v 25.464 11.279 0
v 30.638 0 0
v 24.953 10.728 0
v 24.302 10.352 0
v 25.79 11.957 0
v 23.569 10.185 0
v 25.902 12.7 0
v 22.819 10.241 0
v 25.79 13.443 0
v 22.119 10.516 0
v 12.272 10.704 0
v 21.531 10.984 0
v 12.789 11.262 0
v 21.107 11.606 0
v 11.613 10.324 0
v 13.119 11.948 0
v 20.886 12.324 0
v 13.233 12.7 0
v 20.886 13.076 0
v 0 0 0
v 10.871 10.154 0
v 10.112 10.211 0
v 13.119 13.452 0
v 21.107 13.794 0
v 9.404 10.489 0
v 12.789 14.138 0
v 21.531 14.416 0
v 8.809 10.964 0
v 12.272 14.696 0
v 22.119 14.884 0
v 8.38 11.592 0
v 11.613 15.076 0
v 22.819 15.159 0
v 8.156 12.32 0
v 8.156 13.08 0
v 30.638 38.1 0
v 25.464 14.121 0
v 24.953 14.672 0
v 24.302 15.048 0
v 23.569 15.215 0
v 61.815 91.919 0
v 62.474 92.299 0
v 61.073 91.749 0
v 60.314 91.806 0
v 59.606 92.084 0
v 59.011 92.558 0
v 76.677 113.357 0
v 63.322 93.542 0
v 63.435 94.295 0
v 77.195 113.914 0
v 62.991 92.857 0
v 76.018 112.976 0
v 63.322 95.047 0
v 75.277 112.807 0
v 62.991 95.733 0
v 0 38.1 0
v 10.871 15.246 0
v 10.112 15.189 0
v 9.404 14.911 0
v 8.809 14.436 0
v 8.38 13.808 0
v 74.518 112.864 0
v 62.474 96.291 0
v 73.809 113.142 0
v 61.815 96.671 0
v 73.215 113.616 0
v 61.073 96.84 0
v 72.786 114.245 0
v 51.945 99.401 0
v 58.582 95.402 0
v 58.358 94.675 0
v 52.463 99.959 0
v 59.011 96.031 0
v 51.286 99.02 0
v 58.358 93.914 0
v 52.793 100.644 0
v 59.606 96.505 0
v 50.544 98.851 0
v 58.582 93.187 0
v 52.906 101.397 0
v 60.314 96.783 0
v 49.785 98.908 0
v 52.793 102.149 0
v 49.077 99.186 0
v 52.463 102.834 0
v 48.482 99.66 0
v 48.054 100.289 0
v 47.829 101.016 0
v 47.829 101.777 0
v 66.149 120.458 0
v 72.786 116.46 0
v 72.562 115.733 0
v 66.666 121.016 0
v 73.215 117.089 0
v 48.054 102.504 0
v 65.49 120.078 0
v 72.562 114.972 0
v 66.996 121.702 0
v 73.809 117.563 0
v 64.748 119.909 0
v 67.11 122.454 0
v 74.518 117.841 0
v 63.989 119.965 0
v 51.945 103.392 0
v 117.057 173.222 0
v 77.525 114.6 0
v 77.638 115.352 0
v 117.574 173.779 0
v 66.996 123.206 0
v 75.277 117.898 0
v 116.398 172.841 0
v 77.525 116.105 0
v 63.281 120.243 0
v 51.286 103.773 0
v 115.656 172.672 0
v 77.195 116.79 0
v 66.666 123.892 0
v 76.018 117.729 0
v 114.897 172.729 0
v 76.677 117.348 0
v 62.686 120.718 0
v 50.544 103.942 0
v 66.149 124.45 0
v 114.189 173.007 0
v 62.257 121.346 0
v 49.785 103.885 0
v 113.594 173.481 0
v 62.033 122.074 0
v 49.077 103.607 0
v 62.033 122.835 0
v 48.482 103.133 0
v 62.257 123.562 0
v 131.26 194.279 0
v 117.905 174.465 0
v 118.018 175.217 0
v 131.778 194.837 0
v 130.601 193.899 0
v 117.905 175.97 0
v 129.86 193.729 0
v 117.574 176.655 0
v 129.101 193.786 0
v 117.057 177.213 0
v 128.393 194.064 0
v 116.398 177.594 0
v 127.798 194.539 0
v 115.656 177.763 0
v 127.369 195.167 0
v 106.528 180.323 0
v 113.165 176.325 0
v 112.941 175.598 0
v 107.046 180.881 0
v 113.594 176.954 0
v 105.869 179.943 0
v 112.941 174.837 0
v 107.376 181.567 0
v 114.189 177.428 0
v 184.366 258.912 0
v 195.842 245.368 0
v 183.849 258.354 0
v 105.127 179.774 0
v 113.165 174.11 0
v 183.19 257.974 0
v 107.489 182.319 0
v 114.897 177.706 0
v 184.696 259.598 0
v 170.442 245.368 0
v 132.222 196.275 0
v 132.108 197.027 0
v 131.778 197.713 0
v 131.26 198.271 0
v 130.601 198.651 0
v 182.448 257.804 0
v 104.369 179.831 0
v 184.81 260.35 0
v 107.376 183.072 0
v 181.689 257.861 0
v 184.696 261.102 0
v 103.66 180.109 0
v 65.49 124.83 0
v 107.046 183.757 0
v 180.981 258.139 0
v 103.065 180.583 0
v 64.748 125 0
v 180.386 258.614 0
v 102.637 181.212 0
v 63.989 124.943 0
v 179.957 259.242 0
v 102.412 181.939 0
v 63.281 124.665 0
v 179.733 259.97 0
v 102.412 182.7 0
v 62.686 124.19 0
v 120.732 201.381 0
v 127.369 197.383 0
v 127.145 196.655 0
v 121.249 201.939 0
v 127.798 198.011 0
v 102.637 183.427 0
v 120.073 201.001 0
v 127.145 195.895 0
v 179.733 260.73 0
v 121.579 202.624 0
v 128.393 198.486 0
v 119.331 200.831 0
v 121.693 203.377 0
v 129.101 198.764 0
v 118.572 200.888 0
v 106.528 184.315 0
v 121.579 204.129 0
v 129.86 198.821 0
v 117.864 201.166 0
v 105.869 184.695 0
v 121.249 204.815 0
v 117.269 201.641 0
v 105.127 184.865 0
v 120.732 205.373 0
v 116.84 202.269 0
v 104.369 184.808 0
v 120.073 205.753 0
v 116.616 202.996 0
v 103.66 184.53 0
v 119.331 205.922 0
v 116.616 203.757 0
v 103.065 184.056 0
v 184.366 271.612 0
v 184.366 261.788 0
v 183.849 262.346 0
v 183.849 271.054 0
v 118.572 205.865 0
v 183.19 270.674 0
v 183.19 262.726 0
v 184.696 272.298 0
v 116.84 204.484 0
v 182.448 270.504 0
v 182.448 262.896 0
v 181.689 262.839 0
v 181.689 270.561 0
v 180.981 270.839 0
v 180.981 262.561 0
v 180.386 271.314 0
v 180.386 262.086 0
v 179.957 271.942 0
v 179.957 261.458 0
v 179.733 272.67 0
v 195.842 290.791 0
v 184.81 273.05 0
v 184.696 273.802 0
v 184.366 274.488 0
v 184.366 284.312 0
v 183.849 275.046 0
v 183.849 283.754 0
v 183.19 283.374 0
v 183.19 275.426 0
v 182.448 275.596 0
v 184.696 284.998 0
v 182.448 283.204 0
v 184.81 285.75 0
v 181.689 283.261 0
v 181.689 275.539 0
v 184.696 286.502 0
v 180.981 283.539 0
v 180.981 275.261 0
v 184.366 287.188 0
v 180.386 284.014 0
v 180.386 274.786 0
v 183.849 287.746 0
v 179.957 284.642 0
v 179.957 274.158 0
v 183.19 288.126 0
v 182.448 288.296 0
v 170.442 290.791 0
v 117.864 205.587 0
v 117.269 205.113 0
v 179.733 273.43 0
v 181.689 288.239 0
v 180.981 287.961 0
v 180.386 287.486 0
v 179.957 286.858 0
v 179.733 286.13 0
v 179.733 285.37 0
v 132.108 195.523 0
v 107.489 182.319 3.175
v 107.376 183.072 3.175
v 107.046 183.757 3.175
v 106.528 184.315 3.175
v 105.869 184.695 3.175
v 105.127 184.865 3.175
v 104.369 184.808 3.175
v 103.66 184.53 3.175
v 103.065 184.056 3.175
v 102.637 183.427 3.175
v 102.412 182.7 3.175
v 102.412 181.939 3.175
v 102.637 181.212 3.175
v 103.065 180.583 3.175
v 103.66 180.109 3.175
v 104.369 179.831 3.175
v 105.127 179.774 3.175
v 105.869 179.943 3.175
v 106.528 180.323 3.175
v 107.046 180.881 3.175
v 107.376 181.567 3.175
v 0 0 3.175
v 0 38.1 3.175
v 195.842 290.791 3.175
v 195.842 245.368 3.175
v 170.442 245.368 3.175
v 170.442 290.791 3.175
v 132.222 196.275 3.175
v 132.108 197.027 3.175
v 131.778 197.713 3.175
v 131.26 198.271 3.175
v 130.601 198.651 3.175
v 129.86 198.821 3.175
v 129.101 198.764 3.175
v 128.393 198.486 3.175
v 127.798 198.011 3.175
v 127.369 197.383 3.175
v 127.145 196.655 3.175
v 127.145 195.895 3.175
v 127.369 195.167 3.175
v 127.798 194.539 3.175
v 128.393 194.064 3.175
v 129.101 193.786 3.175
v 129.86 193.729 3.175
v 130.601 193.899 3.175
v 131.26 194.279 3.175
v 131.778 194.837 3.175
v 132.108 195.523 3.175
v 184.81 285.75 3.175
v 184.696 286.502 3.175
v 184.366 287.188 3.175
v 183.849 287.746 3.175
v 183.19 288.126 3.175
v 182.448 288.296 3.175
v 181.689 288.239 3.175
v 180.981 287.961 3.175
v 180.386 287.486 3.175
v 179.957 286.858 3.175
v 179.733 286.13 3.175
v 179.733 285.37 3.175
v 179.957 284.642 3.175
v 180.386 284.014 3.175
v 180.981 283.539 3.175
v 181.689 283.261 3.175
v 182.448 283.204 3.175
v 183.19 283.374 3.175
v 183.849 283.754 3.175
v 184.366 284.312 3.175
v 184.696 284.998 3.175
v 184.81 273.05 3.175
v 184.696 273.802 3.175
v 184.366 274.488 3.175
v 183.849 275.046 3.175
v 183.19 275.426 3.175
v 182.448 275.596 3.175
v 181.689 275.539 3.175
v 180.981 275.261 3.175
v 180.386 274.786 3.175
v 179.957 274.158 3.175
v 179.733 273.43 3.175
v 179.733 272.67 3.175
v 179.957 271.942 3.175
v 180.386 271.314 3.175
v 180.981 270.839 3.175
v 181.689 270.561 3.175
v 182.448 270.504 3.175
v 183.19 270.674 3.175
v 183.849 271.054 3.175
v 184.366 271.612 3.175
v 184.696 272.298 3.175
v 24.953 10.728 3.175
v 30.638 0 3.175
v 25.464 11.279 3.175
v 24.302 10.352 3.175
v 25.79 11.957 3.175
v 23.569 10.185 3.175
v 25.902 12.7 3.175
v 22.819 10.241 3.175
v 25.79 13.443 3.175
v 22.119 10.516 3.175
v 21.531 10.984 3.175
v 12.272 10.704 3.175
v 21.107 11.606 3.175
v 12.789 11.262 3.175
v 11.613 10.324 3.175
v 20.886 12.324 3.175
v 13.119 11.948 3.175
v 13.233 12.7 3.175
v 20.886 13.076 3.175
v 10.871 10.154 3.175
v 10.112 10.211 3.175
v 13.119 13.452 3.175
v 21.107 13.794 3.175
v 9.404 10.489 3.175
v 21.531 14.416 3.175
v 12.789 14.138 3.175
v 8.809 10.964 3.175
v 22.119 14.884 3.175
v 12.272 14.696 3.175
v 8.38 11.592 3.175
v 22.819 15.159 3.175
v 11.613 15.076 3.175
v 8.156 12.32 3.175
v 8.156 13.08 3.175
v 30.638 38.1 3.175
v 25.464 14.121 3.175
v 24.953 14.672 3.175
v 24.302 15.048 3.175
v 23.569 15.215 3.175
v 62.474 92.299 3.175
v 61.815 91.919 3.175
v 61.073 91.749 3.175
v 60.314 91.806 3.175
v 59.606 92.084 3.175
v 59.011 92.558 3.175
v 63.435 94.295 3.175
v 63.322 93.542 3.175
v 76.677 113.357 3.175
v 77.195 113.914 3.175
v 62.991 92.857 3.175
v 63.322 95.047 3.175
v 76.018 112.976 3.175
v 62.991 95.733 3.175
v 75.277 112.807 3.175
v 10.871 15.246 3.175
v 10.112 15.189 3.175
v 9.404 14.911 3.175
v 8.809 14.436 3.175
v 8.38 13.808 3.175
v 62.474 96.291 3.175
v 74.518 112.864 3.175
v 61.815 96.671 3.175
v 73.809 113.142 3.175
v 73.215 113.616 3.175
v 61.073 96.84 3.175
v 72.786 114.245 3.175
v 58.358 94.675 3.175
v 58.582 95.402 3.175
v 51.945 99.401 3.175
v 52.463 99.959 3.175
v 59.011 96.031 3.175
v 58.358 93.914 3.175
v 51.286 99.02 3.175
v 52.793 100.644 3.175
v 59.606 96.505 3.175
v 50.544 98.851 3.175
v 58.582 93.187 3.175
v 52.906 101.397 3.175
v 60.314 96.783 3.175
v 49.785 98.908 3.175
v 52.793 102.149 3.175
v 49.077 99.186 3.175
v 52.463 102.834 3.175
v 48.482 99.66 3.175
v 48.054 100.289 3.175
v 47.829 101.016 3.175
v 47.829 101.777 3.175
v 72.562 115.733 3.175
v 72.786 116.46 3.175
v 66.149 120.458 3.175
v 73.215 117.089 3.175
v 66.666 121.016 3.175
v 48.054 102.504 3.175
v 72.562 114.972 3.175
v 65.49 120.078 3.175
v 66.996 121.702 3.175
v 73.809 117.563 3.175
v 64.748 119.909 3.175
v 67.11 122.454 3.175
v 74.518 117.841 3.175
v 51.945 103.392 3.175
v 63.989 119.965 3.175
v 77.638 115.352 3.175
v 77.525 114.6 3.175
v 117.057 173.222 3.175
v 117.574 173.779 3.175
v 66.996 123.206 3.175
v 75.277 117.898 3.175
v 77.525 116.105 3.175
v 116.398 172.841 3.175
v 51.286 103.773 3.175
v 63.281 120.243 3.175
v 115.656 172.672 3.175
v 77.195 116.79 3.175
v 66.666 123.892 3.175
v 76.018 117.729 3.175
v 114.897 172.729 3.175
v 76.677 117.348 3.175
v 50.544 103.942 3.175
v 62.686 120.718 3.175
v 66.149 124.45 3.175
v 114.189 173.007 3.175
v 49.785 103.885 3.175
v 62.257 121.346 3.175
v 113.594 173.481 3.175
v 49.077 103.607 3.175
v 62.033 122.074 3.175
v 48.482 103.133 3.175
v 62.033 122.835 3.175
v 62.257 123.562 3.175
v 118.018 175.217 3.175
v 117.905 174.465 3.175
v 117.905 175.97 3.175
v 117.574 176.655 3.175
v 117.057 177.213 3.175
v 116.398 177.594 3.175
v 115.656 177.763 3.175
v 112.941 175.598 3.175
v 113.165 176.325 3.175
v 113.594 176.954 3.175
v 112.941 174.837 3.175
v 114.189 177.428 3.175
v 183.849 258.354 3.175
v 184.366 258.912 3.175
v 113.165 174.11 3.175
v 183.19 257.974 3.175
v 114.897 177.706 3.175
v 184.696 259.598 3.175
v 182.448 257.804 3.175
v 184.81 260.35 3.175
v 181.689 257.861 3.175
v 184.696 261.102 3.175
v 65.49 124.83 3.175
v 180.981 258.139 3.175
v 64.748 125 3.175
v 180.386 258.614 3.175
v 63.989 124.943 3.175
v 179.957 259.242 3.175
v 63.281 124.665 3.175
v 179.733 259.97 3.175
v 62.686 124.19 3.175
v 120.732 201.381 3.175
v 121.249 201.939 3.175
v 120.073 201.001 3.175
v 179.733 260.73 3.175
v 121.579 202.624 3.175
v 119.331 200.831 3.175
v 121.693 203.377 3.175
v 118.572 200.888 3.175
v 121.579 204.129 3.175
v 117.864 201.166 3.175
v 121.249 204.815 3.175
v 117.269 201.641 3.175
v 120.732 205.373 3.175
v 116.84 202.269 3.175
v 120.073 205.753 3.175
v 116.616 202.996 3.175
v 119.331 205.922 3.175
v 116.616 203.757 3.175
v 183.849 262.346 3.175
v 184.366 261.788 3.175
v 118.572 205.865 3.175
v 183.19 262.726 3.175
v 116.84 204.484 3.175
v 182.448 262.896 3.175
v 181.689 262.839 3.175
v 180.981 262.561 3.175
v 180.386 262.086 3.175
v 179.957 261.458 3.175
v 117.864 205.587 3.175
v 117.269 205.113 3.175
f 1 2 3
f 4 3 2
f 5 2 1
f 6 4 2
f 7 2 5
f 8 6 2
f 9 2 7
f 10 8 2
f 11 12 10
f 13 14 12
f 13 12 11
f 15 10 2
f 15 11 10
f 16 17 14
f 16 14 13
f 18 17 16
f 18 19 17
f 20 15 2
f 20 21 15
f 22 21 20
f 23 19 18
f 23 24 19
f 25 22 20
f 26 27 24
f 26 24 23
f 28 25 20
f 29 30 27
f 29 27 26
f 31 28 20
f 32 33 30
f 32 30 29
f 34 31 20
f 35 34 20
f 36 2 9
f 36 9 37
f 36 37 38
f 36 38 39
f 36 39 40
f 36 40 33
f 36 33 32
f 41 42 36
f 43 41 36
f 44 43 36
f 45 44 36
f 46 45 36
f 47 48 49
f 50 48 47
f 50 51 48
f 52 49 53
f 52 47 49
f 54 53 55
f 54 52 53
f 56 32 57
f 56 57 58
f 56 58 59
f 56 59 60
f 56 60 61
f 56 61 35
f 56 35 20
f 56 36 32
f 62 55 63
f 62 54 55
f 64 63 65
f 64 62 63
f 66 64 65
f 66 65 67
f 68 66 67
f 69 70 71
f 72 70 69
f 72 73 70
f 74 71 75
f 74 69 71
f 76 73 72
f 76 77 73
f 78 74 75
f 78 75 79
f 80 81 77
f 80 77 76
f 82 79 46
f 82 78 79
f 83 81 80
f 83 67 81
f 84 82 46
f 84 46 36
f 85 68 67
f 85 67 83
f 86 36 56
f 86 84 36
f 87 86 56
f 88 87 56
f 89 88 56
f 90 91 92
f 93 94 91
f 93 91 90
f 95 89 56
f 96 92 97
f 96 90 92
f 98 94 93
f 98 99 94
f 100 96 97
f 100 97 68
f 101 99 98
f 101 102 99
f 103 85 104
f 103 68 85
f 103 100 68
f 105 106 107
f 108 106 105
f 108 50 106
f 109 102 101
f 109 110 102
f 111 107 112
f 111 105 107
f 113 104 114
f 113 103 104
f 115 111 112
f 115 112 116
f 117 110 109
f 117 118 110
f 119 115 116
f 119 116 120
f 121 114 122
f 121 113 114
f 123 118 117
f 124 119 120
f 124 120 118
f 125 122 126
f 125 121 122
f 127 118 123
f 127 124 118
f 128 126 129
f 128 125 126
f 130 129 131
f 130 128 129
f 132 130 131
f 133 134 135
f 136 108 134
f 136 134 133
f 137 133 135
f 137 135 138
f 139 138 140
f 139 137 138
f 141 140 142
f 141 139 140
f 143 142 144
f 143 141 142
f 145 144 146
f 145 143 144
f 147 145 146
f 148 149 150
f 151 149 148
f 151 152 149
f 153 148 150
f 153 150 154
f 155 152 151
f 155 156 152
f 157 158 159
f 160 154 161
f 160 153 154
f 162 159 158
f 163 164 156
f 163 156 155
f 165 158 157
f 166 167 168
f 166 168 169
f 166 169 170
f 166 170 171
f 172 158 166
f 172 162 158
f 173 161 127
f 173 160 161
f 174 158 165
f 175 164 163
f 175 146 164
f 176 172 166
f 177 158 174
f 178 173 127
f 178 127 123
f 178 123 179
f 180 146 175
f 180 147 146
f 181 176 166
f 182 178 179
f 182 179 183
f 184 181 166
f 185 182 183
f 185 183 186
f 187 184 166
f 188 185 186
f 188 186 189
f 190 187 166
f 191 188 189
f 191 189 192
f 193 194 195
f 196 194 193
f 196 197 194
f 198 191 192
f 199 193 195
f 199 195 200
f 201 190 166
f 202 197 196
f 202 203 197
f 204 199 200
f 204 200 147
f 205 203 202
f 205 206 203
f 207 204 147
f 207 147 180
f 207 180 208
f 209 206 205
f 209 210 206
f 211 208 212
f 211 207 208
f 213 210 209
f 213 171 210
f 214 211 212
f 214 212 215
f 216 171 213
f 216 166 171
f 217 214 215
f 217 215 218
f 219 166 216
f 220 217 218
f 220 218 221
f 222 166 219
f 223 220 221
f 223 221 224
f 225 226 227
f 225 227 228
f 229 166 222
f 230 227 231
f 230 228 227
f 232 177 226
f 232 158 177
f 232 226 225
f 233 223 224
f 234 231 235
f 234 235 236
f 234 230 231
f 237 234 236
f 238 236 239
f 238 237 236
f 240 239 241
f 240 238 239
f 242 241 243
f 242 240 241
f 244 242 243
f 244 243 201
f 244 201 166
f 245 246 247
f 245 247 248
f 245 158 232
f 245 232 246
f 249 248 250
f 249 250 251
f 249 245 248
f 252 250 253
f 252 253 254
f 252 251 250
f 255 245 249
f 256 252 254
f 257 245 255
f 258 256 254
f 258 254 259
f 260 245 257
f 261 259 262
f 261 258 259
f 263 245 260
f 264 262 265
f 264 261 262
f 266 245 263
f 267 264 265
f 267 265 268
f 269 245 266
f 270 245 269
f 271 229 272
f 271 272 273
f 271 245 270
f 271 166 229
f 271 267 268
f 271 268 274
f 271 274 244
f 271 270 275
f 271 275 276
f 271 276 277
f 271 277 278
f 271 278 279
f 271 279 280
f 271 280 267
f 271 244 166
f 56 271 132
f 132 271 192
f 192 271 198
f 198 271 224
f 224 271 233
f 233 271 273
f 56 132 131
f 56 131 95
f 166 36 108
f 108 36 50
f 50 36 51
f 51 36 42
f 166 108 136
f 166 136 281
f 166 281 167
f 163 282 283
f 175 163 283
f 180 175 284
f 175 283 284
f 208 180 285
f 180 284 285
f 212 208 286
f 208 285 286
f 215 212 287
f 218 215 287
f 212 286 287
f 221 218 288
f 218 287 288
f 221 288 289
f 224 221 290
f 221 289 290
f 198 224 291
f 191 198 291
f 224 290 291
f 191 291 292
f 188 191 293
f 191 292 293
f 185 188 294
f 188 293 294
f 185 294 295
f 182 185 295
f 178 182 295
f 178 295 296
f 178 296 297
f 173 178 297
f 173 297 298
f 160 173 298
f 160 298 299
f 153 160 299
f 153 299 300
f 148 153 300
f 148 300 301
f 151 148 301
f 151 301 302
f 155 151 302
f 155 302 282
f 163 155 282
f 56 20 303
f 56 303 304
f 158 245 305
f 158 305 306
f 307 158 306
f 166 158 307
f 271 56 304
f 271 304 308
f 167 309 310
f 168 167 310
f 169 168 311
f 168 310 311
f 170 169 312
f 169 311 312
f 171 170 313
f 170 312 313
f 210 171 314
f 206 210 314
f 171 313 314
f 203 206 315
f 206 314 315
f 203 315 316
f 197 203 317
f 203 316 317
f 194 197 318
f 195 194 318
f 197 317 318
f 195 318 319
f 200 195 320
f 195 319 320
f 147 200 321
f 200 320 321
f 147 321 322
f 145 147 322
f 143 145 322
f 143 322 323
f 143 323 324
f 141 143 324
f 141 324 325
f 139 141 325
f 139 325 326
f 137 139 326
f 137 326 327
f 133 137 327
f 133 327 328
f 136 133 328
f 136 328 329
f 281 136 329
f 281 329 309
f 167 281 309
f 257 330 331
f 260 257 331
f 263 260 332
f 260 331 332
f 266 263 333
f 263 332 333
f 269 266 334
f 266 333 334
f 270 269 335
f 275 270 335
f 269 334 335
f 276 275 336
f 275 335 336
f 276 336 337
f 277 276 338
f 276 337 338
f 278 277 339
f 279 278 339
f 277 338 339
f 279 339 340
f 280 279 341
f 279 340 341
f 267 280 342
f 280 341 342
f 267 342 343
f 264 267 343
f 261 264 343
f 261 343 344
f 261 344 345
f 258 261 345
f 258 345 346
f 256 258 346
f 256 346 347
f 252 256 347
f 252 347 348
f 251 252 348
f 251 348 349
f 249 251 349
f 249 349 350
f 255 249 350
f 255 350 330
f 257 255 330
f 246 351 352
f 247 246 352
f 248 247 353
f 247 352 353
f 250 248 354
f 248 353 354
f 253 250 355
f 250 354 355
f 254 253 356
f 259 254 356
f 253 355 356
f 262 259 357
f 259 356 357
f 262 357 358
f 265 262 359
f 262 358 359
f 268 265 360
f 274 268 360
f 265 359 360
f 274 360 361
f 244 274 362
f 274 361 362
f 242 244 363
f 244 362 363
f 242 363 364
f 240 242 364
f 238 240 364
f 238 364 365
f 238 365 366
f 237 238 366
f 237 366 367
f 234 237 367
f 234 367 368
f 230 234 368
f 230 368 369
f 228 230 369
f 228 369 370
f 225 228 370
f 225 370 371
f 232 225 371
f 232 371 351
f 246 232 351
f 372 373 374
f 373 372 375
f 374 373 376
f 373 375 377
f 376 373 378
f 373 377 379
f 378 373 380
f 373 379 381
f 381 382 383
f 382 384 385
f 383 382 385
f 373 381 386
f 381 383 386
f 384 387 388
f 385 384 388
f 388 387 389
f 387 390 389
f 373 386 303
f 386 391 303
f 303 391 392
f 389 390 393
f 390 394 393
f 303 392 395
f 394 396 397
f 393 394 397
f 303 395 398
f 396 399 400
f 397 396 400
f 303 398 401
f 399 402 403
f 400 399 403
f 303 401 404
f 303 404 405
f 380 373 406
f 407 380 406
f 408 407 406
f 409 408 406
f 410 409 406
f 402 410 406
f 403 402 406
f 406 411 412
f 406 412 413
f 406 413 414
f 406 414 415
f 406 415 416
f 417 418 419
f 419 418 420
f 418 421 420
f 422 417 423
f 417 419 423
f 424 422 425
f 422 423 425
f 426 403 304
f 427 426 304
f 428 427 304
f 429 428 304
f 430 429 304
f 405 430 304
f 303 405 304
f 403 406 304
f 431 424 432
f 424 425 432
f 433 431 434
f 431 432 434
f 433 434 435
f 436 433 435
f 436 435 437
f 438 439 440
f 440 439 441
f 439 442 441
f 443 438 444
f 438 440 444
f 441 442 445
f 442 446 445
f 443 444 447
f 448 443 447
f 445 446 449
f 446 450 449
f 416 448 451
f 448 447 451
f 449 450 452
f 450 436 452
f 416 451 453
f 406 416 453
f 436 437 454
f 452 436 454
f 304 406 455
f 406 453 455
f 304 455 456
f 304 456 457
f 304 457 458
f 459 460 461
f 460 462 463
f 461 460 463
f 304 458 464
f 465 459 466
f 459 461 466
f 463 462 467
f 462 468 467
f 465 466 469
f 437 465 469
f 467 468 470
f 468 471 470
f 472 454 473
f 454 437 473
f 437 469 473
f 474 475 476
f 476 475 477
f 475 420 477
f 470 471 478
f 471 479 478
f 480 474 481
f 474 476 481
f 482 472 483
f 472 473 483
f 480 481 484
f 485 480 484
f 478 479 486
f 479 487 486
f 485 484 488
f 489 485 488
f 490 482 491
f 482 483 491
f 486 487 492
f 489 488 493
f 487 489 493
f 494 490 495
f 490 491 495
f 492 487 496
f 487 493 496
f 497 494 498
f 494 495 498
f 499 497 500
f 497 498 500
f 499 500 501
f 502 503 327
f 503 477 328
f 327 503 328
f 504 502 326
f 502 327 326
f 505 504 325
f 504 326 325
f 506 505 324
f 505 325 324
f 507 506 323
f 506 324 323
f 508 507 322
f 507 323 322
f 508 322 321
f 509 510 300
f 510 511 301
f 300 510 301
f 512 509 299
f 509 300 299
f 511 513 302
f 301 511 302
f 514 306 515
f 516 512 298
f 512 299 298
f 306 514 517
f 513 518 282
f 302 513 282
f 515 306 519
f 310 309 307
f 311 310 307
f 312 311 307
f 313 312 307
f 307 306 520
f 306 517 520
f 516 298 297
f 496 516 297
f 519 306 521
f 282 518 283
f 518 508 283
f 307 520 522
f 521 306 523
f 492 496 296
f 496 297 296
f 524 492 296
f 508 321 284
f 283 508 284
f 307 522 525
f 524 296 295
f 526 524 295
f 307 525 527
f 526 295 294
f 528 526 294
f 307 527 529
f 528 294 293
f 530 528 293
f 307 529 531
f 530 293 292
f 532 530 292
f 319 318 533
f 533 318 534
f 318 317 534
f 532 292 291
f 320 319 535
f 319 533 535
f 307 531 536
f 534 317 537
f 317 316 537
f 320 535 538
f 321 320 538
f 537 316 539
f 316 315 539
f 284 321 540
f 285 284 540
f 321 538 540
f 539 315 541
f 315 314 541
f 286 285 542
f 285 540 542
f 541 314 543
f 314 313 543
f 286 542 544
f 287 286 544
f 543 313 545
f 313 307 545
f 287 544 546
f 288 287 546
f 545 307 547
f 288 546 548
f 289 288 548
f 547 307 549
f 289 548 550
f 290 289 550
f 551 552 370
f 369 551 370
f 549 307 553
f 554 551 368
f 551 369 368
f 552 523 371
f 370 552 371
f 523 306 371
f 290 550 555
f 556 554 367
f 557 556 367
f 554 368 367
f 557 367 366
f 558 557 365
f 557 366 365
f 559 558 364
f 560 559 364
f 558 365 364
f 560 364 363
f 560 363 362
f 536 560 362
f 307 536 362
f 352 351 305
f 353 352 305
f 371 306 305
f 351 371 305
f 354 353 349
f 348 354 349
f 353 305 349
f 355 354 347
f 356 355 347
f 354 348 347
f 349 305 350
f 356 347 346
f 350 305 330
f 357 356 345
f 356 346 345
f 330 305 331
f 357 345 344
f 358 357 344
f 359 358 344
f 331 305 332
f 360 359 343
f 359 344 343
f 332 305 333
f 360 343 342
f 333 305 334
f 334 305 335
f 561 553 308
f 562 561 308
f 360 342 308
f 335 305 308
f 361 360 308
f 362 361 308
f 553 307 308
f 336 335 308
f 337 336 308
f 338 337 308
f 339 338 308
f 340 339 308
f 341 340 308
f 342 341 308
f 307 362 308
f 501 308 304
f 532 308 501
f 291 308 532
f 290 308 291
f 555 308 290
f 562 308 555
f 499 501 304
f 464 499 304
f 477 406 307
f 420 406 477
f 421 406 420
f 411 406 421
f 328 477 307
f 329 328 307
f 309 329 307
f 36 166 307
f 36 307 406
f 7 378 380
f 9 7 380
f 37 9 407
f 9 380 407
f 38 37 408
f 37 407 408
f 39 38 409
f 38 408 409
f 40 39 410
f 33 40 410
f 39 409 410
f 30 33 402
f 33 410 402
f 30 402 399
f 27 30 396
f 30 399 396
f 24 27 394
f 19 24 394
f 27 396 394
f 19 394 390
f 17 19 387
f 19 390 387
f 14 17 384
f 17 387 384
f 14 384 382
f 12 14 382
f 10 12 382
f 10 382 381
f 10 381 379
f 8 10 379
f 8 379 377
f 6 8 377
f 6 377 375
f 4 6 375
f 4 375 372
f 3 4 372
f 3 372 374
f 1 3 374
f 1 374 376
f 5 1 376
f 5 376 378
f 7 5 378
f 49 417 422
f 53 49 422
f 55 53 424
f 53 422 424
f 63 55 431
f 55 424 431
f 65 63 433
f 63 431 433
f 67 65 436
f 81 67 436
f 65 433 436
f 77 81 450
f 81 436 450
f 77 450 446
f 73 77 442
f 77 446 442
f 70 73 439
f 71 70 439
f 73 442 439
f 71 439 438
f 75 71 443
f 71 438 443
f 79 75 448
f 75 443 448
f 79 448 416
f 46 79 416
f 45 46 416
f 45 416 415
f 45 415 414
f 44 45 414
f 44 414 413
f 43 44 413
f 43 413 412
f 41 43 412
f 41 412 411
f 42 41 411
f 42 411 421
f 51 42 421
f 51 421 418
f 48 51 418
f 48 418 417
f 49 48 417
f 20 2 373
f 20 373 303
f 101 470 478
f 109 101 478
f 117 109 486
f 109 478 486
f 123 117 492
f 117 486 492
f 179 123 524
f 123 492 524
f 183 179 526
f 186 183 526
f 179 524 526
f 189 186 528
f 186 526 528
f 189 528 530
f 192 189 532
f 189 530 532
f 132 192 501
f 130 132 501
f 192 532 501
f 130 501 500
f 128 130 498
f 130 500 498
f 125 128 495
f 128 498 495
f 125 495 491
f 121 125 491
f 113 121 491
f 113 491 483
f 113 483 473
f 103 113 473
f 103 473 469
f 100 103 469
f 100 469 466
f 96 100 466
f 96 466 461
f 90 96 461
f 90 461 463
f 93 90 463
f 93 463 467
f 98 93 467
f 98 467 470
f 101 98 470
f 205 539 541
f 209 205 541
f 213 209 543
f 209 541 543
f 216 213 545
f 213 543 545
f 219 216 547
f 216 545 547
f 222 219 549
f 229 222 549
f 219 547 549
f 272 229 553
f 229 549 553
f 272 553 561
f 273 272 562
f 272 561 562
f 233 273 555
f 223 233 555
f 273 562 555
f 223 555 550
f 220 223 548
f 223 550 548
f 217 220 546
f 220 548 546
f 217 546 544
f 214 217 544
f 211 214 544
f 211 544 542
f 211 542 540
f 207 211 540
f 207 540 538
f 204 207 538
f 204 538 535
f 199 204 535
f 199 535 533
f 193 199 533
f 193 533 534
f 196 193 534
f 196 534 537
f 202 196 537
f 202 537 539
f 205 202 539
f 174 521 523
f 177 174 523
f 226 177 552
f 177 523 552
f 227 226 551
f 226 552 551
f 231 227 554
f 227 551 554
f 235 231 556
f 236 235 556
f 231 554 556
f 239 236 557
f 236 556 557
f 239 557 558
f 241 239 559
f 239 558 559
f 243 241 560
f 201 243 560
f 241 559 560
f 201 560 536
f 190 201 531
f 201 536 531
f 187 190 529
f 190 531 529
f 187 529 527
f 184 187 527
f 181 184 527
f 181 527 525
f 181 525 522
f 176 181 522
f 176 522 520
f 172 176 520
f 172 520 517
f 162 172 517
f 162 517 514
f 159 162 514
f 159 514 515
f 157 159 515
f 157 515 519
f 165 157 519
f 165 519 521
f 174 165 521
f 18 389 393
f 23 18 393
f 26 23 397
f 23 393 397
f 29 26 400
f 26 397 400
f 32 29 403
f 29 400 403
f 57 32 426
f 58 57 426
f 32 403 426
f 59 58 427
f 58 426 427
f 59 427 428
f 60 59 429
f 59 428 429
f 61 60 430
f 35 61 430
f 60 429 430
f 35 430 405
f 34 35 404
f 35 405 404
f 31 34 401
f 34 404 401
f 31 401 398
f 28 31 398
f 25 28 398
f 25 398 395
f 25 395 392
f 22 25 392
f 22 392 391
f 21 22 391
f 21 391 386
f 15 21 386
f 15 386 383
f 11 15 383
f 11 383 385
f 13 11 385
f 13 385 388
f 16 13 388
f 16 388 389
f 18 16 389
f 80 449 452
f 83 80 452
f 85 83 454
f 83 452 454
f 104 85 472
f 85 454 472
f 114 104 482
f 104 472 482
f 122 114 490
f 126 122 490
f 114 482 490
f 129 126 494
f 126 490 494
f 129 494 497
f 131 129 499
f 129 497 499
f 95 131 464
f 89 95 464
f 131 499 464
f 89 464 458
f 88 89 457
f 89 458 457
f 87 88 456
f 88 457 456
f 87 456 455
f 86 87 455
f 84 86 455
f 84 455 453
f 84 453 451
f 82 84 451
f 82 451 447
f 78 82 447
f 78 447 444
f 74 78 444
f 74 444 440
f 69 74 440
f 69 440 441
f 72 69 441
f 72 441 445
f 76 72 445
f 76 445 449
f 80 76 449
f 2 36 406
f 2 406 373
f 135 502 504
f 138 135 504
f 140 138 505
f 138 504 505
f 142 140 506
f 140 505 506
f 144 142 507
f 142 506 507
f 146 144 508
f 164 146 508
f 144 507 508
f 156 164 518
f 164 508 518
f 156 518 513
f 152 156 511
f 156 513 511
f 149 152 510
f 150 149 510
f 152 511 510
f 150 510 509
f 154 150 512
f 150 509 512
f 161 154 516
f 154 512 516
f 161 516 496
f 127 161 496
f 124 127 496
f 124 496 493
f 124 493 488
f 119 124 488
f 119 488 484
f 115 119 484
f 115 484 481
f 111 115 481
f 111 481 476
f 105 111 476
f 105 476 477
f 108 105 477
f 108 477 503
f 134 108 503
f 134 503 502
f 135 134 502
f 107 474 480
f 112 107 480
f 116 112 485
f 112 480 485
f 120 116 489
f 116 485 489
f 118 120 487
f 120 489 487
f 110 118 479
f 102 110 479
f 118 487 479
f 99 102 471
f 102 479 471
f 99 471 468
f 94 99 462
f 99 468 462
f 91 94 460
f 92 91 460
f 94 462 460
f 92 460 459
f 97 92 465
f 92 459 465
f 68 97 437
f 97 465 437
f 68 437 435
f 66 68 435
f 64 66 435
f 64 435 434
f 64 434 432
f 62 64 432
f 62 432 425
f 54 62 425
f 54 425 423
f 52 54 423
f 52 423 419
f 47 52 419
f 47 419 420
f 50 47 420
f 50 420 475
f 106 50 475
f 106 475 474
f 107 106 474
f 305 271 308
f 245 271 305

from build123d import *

# Parameters (mm, degrees)
BOSS_EXTRUDE1_DEPTH = 3.175
SKETCH2_R           = 2.5527
SKETCH2_R_2         = 2.522358926
CUT_EXTRUDE1_DEPTH  = 351.604295129
SKETCH3_R           = 2.5527
CUT_EXTRUDE2_DEPTH  = 351.604295129


with BuildPart() as part:
    # Sketch1 → Boss-Extrude1 (new body)
    with BuildSketch(Plane.XY):
        Polygon((0, 0), (0, 38.1), (170.441996978, 290.790652115), (195.841996978, 290.790652115), (195.841996978, 245.368044206), (170.441996978, 245.368044206), (30.637935892, 38.1), (30.637935892, 0), align=None)
    extrude(amount=BOSS_EXTRUDE1_DEPTH)

    # Sketch2 → Cut-Extrude1 (cut, through all)
    with BuildSketch(Plane.XY.offset(3.175)):
        with Locations((182.257063518, 285.750000017)):
            Circle(SKETCH2_R)
        with Locations((182.257063518, 273.050000017)):
            Circle(SKETCH2_R)
        with Locations((23.380063476, 12.7)):
            Circle(SKETCH2_R_2)
        with Locations((10.680063476, 12.7)):
            Circle(SKETCH2_R)
        with Locations((182.257063518, 260.350000017)):
            Circle(SKETCH2_R)
    extrude(amount=-CUT_EXTRUDE1_DEPTH, mode=Mode.SUBTRACT)

    # Sketch3 → Cut-Extrude2 (cut, through all)
    with BuildSketch(Plane.XY.offset(3.175)):
        with Locations((104.936582102, 182.319228816)):
            Circle(SKETCH3_R)
        with Locations((129.668859022, 196.275033285)):
            Circle(SKETCH3_R)
        with Locations((119.14008185, 203.376783159)):
            Circle(SKETCH3_R)
        with Locations((115.465359274, 175.217478942)):
            Circle(SKETCH3_R)
        with Locations((50.353519505, 101.396510668)):
            Circle(SKETCH3_R)
        with Locations((64.557019253, 122.454065011)):
            Circle(SKETCH3_R)
        with Locations((75.085796425, 115.352315137)):
            Circle(SKETCH3_R)
        with Locations((60.882296677, 94.294760794)):
            Circle(SKETCH3_R)
    extrude(amount=-CUT_EXTRUDE2_DEPTH, mode=Mode.SUBTRACT)


solid = part.part
